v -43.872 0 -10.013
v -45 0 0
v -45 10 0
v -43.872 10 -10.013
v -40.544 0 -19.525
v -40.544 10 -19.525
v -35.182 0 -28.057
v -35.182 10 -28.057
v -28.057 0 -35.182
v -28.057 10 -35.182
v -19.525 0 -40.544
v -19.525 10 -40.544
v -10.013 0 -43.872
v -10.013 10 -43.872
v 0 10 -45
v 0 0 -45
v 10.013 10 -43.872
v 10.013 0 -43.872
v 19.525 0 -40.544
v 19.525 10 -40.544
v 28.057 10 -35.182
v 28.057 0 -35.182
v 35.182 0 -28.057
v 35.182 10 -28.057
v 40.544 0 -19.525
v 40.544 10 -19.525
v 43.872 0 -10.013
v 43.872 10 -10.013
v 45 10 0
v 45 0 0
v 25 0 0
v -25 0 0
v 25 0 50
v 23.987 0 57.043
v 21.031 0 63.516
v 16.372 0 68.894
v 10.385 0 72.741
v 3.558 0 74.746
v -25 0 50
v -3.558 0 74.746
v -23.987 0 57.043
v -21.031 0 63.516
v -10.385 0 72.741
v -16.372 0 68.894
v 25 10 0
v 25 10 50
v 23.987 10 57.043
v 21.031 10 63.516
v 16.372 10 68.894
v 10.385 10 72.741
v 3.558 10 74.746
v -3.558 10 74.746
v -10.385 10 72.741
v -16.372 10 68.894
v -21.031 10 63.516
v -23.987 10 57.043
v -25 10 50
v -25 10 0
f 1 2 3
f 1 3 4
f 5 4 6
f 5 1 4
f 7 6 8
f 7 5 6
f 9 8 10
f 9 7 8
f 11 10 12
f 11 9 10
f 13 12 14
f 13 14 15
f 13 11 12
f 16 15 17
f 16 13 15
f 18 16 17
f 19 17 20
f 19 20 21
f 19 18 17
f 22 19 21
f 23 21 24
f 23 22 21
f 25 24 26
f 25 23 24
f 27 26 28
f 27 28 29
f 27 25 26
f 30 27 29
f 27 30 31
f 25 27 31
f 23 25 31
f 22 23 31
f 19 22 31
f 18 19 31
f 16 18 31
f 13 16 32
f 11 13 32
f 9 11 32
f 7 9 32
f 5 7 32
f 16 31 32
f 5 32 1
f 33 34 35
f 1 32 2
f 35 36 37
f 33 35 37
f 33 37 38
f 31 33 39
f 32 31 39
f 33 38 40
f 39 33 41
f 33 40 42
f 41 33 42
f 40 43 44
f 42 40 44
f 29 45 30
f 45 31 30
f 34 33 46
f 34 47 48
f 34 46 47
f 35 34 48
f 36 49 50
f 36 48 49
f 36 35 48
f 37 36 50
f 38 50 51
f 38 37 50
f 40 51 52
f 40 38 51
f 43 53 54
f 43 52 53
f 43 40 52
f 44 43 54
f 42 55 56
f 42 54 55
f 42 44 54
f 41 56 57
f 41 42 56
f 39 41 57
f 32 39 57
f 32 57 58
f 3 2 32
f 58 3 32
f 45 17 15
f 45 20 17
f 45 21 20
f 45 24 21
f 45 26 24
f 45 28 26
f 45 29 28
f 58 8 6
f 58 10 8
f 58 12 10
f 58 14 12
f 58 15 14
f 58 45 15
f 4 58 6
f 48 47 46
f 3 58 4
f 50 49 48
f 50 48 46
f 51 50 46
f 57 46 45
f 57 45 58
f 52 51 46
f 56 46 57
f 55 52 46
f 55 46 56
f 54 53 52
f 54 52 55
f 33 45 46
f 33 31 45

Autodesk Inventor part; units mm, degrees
ref_plane "YZ Plane" through (0, 0, 0) normal (1, 0, 0) x (0, 1, 0)
ref_plane "XZ Plane" through (0, 0, 0) normal (0, 1, 0) x (-1, 0, 0)
ref_plane "XY Plane" through (0, 0, 0) normal (0, 0, 1) x (1, 0, 0)
sketch "Boceto1" plane through (0, 0, 0) normal (0, 1, 0) x (-1, 0, 0)
  arc A0 (-45, 0) -> (45, 0) centre (0, 0) ccw
  line L0 (45, 0) -> (-45, 0)
  line L1 (25, -50) -> (-25, -50)
  line L2 (-25, -50) -> (-25, 50)
  line L3 (-25, 50) -> (25, 50)
  line L4 (25, 50) -> (25, -50)
  line L5 (25, -50) -> (-25, 50) construction
  line L6 (-25, -50) -> (25, 50) construction
  circle A1 centre (0, 50) radius 25
  point P0 (25, 0)
  point P1 (25, 50)
  point P2 (-25, 0)
  dimension "d0" = 90
  dimension "d1" = 50
  dimension "d2" = 100
extrude "Extrusión1" add sketch "Boceto1" along normal blind 10 contours L0 L2 A0 | L2 L0 L4 A0 | L2 A1 L4 L0 | L4 L0 A0 | A1 L3 | L3 A1
equation "\"d0\" = diametro_c"
equation "\"d1\" = ancho_p"
equation "\"d2\" = largo_p"
equation "\"d3\" = grueso"
equation "\"diametro_c\" = 90"
equation "\"grueso\" = 10"
equation "\"ancho_p\" = 50"
equation "\"largo_p\" = 100"
properties part number "Parte D" material "Madera (abedul)"
